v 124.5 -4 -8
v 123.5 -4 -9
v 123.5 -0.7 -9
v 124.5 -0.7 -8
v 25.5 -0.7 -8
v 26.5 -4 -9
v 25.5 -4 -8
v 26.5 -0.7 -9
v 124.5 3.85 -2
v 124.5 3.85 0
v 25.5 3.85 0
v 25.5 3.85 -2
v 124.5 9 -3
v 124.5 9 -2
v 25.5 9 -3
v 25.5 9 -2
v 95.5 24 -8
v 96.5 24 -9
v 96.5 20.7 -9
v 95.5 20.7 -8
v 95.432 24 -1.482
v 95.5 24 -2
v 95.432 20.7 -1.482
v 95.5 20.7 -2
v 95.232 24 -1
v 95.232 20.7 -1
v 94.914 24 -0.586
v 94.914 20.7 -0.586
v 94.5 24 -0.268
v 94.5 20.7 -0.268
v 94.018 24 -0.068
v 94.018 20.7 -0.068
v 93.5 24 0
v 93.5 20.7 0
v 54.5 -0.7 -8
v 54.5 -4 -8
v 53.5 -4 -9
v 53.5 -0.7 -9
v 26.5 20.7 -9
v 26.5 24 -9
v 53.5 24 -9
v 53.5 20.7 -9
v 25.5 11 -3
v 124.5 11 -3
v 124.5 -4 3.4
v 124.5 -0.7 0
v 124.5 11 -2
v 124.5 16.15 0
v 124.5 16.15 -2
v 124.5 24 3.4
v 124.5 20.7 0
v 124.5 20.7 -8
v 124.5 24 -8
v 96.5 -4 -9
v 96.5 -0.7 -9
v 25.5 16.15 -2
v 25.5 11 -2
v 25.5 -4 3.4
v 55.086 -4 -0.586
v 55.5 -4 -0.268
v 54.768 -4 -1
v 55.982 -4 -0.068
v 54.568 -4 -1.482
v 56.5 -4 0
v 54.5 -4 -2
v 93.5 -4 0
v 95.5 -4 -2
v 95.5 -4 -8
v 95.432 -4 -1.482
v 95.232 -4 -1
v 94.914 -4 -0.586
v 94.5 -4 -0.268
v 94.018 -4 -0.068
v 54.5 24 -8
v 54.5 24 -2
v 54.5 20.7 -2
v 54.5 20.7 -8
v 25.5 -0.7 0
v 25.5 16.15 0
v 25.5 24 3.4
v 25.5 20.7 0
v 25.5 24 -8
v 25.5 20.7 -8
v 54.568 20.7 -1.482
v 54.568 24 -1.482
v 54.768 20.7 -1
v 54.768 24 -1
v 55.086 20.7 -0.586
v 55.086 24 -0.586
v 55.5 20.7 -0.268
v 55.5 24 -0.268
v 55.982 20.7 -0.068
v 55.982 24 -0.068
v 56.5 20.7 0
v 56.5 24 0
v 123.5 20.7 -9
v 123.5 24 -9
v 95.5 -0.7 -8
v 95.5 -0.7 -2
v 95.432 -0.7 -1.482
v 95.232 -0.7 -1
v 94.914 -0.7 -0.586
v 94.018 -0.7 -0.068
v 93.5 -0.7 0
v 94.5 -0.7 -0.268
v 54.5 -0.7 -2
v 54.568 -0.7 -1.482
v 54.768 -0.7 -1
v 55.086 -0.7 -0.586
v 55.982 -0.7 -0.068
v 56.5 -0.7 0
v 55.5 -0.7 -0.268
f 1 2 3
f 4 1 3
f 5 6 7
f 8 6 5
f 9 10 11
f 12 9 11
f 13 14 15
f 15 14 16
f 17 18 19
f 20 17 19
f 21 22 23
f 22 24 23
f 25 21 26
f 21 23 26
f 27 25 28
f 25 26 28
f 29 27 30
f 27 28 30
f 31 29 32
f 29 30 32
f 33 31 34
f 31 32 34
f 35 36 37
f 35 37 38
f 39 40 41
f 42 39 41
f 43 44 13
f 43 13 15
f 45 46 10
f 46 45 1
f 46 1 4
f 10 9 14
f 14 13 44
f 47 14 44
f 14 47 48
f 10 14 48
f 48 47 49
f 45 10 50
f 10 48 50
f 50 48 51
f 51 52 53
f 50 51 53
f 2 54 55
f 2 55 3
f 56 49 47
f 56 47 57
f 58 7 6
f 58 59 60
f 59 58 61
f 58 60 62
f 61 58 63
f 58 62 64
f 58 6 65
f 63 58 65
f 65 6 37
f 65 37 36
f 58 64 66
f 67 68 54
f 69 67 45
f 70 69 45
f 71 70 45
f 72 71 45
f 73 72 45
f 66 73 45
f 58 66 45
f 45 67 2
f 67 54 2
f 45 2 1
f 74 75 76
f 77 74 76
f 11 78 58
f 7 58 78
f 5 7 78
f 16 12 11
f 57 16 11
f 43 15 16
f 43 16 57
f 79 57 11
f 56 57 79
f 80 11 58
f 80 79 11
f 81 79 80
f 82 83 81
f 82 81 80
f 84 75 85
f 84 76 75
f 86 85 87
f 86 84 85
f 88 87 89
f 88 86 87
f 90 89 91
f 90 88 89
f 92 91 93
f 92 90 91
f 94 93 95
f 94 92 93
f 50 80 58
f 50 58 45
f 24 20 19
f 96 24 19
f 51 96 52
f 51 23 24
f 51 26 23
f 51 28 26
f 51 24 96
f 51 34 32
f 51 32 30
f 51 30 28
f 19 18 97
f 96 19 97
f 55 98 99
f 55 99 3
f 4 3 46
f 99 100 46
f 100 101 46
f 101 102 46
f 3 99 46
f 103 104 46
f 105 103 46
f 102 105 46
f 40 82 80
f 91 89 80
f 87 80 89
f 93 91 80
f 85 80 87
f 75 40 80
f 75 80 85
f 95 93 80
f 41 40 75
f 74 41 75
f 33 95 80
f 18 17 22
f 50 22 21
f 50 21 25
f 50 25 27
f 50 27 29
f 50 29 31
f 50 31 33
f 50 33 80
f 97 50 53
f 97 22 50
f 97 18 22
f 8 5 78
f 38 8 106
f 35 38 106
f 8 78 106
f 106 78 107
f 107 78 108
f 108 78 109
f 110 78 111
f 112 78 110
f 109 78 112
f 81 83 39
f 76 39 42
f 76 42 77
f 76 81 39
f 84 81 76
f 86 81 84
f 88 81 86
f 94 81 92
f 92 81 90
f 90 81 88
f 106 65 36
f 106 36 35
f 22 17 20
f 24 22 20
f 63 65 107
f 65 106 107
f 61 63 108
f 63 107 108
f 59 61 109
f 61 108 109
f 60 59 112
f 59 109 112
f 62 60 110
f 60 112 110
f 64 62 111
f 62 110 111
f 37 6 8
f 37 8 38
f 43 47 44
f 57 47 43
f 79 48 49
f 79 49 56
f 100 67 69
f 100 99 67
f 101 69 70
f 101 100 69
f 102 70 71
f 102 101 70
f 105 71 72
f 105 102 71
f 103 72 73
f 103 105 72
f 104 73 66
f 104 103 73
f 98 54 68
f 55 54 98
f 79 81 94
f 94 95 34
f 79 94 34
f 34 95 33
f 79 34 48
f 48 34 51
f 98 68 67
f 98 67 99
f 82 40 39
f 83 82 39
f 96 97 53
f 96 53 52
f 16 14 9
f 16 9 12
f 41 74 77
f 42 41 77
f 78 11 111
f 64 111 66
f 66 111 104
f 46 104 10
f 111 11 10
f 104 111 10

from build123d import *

# Parameters (mm, degrees)
SKETCH1_W           = 99
SKETCH1_H           = 28
BOSS_EXTRUDE1_DEPTH = 2.5
SKETCH2_W           = 29
SKETCH2_H           = 7
BOSS_EXTRUDE2_DEPTH = 3.3
FILLET1_R           = 2
SKETCH5_W           = 99
SKETCH5_H           = 9
BOSS_EXTRUDE3_DEPTH = 2
MOVE_FACE2_BY       = 2
MOVE_FACE2_2_BY     = 2
CHAMFER1_SIZE       = 1
SKETCH6_W           = 99
SKETCH6_H           = 2
BOSS_EXTRUDE4_DEPTH = 1
MOVE_FACE3_BY       = 0.9


with BuildPart() as part:
    # Sketch1 → Boss-Extrude1 (new body)
    with BuildSketch(Plane.XY):
        with Locations((75, 10)):
            Rectangle(SKETCH1_W, SKETCH1_H)
    extrude(amount=BOSS_EXTRUDE1_DEPTH)

    # Sketch2 → Boss-Extrude2 (add)
    with BuildSketch(Plane.XZ.offset(4)):
        with Locations((40, -3.5)):
            Rectangle(SKETCH2_W, SKETCH2_H)
        with Locations((110, -3.5)):
            Rectangle(SKETCH2_W, SKETCH2_H)
    extrude(amount=-BOSS_EXTRUDE2_DEPTH)

    # Fillet1
    fillet1_edges = [part.edges().sort_by_distance(p)[0] for p in [
        (54.5, -2.35, 0),
        (95.5, -2.35, 0),
    ]]
    fillet(fillet1_edges, radius=FILLET1_R)

    # Sketch5 → Boss-Extrude3 (add)
    with BuildSketch(Plane(origin=(0, 0, 0), x_dir=(-1, 0, 0), z_dir=(0, 0, -1))):
        with Locations((-75, 11.65)):
            Rectangle(SKETCH5_W, SKETCH5_H)
    extrude(amount=BOSS_EXTRUDE3_DEPTH)

    # Move Face2: a face moved outward by 2.0
    extrude(part.faces().sort_by_distance((40, -2.35, -7))[0], amount=MOVE_FACE2_BY, dir=(0, 0, -1))

    # Move Face2 2: a face moved outward by 2.0
    extrude(part.faces().sort_by_distance((110, -2.35, -7))[0], amount=MOVE_FACE2_2_BY, dir=(0, 0, -1))

    # Chamfer1
    chamfer1_edges = [part.edges().sort_by_distance(p)[0] for p in [
        (54.5, -2.35, -9),
        (25.5, -2.35, -9),
        (95.5, -2.35, -9),
        (124.5, -2.35, -9),
    ]]
    chamfer(chamfer1_edges, length=CHAMFER1_SIZE)

    # Mirror1: part across plane


with BuildPart() as part_1:
    add(part.part)
    add(part.part.mirror(Plane(origin=(0, 10, 0), x_dir=(0, 0, 1), z_dir=(0, -1, 0))))

    # Sketch6 → Boss-Extrude4 (add)
    with BuildSketch(Plane(origin=(0, 0, -2), x_dir=(-1, 0, 0), z_dir=(0, 0, -1))):
        with Locations((-75, 10)):
            Rectangle(SKETCH6_W, SKETCH6_H)
    extrude(amount=BOSS_EXTRUDE4_DEPTH)

    # Move Face3: a face moved outward by 0.9
    extrude(part_1.faces().sort_by_distance((75, 10, 2.5))[0], amount=MOVE_FACE3_BY, dir=(0, 0, 1))


solid = part_1.part
